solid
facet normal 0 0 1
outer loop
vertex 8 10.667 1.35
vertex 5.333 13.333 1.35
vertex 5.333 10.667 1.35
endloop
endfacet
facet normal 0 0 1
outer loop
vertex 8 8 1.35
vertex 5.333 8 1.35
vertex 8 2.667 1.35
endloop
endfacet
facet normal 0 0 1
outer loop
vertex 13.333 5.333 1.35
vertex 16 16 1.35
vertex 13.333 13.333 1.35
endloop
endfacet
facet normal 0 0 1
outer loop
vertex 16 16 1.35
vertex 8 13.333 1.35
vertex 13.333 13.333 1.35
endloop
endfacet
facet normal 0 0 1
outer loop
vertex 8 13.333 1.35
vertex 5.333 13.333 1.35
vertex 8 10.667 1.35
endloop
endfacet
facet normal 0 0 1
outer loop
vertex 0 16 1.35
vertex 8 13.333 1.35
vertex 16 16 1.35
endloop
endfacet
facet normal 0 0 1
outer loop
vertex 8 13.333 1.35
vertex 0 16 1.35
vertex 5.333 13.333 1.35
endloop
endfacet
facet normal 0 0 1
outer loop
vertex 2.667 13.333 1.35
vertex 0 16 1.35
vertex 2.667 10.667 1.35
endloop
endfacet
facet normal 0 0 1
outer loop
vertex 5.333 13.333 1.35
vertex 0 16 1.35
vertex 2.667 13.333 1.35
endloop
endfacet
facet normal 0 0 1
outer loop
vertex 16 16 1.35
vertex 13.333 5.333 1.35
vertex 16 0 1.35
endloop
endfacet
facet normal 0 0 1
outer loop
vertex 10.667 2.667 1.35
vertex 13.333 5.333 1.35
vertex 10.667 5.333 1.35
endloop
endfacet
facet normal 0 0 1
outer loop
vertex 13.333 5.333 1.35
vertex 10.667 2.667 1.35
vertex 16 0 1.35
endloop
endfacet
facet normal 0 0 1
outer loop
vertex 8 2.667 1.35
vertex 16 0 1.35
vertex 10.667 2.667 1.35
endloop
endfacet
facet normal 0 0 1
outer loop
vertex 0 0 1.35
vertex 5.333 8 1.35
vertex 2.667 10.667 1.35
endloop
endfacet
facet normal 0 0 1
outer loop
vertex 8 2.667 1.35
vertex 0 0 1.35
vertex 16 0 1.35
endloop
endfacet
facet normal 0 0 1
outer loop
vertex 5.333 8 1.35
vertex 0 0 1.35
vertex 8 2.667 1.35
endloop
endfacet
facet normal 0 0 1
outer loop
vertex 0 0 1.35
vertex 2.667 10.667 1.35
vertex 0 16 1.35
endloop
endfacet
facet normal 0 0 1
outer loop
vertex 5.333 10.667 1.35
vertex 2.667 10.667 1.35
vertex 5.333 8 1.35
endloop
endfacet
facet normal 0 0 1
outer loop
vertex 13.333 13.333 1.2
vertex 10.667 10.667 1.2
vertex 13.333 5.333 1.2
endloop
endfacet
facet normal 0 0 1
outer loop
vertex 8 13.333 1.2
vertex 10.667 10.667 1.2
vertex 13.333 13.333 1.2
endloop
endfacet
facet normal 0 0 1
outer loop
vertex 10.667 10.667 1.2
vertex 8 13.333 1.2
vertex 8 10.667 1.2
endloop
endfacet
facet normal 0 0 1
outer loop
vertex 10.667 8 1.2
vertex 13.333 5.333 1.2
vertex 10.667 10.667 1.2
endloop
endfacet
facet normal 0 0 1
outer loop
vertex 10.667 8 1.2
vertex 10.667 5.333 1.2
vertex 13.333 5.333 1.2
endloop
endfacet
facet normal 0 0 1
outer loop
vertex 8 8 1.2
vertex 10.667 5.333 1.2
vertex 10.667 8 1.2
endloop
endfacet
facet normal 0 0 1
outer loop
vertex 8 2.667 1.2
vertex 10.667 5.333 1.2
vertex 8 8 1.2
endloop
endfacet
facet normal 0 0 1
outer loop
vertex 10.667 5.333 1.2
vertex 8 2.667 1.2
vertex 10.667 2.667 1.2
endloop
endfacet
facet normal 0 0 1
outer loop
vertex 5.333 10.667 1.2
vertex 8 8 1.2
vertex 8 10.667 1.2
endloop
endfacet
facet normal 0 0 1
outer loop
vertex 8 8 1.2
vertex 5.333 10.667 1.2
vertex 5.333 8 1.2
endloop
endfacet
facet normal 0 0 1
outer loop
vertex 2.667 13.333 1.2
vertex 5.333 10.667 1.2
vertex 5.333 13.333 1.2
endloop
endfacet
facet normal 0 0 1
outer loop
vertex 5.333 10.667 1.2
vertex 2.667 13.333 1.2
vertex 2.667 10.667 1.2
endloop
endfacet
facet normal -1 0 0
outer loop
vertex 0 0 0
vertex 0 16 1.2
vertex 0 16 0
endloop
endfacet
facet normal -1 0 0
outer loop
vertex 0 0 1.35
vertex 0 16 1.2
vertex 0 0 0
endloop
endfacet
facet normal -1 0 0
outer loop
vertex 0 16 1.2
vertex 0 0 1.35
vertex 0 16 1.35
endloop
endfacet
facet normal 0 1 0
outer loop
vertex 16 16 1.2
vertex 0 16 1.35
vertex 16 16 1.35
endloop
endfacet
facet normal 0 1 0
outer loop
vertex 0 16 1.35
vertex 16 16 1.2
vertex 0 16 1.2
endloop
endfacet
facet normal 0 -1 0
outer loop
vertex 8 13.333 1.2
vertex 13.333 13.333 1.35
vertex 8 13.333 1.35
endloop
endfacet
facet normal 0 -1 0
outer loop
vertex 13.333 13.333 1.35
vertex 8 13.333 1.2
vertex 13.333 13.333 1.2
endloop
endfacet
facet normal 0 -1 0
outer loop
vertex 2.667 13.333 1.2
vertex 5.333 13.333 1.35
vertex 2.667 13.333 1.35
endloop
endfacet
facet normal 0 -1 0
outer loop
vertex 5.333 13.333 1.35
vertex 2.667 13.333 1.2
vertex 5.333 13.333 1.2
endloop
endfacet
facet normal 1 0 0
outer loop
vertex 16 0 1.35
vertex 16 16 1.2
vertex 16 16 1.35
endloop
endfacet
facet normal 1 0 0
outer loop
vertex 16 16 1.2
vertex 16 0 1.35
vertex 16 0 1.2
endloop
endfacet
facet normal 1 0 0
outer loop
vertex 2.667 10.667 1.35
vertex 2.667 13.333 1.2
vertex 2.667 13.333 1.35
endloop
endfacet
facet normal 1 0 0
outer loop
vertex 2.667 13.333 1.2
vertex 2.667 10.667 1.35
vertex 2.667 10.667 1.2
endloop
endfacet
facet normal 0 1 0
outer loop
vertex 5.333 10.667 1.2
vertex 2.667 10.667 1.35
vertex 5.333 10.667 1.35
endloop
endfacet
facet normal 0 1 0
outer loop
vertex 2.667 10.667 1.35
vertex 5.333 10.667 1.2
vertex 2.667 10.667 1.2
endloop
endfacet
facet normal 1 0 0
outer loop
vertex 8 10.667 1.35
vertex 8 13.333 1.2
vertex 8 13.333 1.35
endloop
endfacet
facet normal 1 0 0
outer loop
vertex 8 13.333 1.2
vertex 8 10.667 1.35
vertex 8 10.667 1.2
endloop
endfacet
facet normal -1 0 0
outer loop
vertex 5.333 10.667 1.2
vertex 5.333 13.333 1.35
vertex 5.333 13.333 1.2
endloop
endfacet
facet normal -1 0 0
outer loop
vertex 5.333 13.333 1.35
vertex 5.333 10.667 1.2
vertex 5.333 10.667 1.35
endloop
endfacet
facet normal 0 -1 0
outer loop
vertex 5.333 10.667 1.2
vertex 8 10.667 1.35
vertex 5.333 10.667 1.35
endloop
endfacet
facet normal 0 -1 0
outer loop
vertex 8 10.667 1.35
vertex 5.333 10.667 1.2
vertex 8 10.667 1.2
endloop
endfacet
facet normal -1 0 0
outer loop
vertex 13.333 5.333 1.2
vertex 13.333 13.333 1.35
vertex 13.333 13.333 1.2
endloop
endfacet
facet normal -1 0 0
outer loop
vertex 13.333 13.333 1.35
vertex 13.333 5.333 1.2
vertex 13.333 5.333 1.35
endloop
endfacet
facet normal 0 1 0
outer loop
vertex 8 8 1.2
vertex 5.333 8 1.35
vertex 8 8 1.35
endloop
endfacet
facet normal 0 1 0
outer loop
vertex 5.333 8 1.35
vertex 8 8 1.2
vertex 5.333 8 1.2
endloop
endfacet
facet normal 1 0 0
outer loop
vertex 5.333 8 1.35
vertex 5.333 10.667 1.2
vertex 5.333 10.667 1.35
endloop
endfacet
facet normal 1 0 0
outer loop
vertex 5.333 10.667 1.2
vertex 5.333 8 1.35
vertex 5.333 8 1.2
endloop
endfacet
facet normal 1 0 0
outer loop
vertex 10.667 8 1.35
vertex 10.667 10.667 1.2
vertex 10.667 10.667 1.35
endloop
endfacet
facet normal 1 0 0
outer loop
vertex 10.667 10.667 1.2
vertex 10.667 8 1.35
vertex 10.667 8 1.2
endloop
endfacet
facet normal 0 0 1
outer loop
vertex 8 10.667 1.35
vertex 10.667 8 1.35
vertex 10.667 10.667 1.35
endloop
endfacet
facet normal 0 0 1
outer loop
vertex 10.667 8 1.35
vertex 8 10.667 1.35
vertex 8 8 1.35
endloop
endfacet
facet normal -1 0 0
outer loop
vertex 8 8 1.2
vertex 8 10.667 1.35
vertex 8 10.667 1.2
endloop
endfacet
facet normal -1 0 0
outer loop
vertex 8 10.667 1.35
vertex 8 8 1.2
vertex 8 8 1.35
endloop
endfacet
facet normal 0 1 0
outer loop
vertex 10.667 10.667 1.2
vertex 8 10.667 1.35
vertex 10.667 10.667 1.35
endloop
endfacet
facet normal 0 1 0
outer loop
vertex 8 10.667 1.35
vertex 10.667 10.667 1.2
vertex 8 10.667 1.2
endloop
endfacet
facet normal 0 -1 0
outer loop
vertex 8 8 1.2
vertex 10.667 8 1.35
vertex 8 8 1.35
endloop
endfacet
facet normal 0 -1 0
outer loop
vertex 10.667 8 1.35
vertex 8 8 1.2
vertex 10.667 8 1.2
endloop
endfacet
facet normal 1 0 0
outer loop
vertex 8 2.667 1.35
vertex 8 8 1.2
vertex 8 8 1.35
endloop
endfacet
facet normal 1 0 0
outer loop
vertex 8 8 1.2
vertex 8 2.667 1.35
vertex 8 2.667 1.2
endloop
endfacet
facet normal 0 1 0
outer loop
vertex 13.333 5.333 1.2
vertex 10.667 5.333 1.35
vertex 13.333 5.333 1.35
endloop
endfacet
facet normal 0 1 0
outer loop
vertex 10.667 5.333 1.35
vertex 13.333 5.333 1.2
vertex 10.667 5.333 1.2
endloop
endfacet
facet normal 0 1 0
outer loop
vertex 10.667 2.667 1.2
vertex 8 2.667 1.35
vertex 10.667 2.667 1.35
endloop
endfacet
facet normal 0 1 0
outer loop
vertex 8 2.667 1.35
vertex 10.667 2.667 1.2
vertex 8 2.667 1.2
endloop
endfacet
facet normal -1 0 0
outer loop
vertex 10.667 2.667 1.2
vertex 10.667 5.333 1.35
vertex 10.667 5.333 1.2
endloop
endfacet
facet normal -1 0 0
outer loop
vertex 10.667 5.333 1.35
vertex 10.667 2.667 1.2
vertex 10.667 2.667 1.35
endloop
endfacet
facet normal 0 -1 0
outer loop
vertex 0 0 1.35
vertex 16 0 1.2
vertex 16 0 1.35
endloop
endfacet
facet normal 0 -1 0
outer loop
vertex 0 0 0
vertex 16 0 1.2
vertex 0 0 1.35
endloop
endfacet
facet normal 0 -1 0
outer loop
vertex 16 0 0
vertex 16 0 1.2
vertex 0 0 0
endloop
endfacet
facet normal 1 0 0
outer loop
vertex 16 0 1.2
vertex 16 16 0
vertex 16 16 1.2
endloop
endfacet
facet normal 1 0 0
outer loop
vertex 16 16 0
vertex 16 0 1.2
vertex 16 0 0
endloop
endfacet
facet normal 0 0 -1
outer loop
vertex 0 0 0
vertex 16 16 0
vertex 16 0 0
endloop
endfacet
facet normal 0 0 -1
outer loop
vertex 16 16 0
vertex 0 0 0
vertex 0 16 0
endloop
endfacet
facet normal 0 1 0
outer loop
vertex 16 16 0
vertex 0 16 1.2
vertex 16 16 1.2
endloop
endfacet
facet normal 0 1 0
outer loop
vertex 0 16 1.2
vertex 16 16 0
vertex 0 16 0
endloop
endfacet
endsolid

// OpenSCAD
// UMI gripper ArUco marker ID 0, DICT_4X4_50.
// Units: millimeters. The black outer edge is exactly 16 mm.

marker_edge = 16;
base_thickness = 1.20;
pattern_height = 0.15;
cell = marker_edge / 6;

// Top-view raster, row 0 is the top edge of the marker.
marker = [
    [1, 1, 1, 1, 1, 1],
    [1, 0, 1, 0, 0, 1],
    [1, 1, 0, 1, 0, 1],
    [1, 1, 1, 0, 0, 1],
    [1, 1, 1, 0, 1, 1],
    [1, 1, 1, 1, 1, 1]
];

color("white") cube([marker_edge, marker_edge, base_thickness]);

for (row = [0:5]) {
    for (col = [0:5]) {
        if (marker[row][col] == 1) {
            // Reverse row index so the OpenSCAD top view matches the PDF.
            color("black")
                translate([col * cell, (5 - row) * cell, base_thickness])
                    cube([cell, cell, pattern_height]);
        }
    }
}
